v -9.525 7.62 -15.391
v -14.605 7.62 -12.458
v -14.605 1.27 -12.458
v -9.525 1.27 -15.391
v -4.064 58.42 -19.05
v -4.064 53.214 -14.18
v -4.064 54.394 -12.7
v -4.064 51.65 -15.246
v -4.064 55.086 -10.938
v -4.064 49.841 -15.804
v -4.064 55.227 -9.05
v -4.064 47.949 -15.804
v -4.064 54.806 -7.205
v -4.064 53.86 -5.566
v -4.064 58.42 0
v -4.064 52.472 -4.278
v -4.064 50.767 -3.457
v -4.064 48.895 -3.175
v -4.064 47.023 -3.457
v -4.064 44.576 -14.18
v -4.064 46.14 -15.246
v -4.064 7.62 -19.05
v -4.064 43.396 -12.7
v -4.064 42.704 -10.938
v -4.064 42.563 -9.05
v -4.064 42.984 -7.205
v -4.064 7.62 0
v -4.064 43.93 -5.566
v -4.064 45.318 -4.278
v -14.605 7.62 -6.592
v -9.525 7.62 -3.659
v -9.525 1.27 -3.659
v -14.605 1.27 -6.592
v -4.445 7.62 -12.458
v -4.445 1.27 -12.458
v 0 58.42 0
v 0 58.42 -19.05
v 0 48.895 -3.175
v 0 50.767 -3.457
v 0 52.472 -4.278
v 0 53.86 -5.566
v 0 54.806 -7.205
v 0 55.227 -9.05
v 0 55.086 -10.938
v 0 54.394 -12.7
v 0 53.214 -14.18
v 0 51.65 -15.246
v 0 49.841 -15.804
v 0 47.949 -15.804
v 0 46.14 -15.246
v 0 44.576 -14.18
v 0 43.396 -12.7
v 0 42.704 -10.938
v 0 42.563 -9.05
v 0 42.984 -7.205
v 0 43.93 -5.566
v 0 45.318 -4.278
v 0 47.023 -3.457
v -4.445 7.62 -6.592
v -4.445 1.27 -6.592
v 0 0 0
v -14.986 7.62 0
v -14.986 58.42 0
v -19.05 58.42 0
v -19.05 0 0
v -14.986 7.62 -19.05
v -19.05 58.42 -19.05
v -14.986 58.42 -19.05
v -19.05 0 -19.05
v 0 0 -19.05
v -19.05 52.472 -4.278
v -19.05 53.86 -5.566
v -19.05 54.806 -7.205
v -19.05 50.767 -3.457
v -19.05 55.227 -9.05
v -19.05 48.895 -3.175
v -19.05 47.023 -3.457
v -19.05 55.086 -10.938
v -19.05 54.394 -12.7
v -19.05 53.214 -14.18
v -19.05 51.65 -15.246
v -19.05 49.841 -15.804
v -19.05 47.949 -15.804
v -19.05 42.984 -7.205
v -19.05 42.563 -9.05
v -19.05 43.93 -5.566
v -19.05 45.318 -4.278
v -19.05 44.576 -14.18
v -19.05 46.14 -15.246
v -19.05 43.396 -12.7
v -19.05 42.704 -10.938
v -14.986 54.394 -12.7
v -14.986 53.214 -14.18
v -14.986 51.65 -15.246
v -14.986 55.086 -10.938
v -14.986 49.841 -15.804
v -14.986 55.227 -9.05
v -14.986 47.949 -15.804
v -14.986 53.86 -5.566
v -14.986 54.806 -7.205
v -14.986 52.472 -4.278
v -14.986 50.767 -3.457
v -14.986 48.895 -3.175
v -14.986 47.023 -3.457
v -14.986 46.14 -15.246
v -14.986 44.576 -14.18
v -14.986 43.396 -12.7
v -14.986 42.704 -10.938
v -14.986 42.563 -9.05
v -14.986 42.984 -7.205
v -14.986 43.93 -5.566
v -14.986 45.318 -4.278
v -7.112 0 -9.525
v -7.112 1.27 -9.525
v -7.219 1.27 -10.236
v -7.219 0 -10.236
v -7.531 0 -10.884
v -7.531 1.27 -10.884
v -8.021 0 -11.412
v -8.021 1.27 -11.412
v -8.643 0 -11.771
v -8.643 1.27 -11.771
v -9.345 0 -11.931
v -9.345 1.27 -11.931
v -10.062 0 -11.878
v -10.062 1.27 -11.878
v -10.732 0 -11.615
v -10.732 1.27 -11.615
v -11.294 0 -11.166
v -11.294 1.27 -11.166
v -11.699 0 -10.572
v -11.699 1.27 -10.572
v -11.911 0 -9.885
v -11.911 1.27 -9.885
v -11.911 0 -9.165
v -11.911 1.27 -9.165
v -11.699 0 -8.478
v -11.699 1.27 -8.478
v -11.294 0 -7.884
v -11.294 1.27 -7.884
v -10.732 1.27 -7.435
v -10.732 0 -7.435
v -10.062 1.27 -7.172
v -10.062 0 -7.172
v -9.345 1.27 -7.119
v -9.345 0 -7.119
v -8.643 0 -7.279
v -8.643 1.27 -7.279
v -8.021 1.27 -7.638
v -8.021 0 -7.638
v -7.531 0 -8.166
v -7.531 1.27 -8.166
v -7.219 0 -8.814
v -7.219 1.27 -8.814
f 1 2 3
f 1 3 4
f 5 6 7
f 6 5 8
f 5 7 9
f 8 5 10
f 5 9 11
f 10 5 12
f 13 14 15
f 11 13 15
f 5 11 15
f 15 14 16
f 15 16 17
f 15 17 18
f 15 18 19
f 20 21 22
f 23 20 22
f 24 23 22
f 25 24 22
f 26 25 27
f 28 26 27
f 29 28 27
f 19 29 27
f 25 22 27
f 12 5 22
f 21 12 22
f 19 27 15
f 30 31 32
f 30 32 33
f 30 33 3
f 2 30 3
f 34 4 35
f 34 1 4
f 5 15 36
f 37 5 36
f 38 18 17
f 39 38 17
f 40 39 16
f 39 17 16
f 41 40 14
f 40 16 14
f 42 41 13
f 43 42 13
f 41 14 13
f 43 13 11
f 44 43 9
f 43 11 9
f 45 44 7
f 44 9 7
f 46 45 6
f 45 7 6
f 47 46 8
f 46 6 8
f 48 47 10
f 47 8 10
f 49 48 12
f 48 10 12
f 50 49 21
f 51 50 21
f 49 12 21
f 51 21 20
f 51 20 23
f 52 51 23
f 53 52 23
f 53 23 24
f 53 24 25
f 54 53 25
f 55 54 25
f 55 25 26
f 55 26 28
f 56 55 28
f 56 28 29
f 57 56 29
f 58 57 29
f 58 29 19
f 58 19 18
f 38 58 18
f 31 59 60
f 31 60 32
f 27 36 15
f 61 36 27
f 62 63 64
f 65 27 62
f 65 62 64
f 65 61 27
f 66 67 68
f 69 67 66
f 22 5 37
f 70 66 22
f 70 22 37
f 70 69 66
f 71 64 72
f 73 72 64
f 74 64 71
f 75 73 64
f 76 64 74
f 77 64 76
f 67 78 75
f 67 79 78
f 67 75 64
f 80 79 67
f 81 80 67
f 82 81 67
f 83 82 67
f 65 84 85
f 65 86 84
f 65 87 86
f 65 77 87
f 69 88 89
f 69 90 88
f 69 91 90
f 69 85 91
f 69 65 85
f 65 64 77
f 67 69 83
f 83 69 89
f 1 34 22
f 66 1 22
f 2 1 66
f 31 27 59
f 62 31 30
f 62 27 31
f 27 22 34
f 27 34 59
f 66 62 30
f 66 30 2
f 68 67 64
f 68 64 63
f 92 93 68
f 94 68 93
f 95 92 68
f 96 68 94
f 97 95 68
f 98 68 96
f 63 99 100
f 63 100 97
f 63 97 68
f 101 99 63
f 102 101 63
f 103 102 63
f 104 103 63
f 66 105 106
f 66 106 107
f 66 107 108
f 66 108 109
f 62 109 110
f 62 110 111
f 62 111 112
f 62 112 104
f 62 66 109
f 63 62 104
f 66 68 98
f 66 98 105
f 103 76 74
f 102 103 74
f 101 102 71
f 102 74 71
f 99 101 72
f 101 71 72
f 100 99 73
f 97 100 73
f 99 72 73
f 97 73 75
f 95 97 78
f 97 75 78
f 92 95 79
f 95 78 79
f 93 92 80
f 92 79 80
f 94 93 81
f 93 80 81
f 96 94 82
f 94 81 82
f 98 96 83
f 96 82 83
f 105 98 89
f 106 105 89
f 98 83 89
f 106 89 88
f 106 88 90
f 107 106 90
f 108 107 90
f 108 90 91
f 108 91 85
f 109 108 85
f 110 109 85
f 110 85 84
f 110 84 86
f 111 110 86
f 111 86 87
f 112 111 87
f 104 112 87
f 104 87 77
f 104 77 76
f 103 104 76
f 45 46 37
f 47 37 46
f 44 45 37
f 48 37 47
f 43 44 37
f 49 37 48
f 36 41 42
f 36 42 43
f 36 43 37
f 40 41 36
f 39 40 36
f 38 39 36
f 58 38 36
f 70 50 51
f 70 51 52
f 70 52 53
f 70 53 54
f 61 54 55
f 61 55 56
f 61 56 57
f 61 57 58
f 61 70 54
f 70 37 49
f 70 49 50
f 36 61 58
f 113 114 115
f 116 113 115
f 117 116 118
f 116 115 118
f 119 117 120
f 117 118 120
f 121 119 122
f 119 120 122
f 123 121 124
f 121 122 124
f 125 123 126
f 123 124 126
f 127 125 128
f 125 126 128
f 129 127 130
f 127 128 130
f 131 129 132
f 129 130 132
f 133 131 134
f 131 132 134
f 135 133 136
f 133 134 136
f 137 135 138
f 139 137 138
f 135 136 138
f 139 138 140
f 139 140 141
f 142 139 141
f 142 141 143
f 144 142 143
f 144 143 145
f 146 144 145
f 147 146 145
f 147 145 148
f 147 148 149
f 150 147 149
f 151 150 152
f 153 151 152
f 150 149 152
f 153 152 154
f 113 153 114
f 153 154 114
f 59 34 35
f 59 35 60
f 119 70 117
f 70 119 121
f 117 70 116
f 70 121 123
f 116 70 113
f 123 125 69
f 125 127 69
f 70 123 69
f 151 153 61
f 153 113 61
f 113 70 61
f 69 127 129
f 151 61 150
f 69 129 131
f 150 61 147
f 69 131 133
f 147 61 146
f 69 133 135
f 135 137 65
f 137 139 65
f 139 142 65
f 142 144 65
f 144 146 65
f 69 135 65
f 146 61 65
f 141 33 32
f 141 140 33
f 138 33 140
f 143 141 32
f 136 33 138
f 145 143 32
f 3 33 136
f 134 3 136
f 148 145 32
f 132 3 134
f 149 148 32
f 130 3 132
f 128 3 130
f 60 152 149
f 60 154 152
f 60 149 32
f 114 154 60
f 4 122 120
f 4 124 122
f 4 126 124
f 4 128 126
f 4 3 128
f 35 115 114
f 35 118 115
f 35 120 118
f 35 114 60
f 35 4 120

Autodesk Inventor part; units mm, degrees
ref_plane "YZ Plane" through (0, 0, 0) normal (1, 0, 0) x (0, 1, 0)
ref_plane "XZ Plane" through (0, 0, 0) normal (0, 1, 0) x (-1, 0, 0)
ref_plane "XY Plane" through (0, 0, 0) normal (0, 0, 1) x (1, 0, 0)
sketch "Sketch1" plane through (0, 0, 0) normal (0, 1, 0) x (-1, 0, 0)
  line L0 (0, 0) -> (19.05, 0)
  line L1 (19.05, 0) -> (19.05, -19.05)
  line L2 (19.05, -19.05) -> (0, -19.05)
  line L3 (0, -19.05) -> (0, 0)
  dimension "d0" = 19.05
  dimension "d1" = 19.05
extrude "Extrusion1" add sketch "Sketch1" along normal blind 7.62
sketch "Sketch2" plane through (0, 7.62, 0) normal (0, 1, 0) x (1, 0, 0)
  line L0 (-9.525, 3.6591) -> (-14.605, 6.5921)
  line L1 (-14.605, 6.5921) -> (-14.605, 12.4579)
  line L2 (-14.605, 12.4579) -> (-9.525, 15.3909)
  line L3 (-9.525, 15.3909) -> (-4.445, 12.4579)
  line L4 (-4.445, 12.4579) -> (-4.445, 6.5921)
  line L5 (-4.445, 6.5921) -> (-9.525, 3.6591)
  line L6 (0, 19.05) -> (-19.05, 19.05) projected
  line L7 (0, 0) -> (0, 19.05) projected
  point P0 (-9.525, 9.525)
  dimension "d4" = 10.16
  dimension "d5" = 9.525
  dimension "d6" = 9.525
extrude "Extrusion2" cut sketch "Sketch2" against normal blind 6.35
sketch "Sketch3" plane through (0, 1.27, 0) normal (0, 1, 0) x (1, 0, 0)
  circle A0 centre (-9.525, 9.525) radius 2.413
  line L0 (-14.605, 12.4579) -> (-9.525, 15.3909) projected
  line L1 (-9.525, 3.6591) -> (-14.605, 6.5921) projected
  point P0 (0, 0)
  dimension "d9" = 4.826
  dimension "d10" = 5.08
  dimension "d11" = 5.08
extrude "Extrusion3" cut sketch "Sketch3" against normal blind 12.7
sketch "Sketch4" plane through (0, 7.62, 0) normal (0, 1, 0) x (1, 0, 0)
  line L0 (0, 19.05) -> (-19.05, 19.05) projected
  line L1 (-19.05, 19.05) -> (-14.986, 19.05)
  line L2 (-14.986, 19.05) -> (-14.986, 0)
  line L3 (-14.986, 0) -> (-19.05, 0)
  line L4 (-19.05, 0) -> (-19.05, 19.05)
  line L5 (0, 19.05) -> (-4.064, 19.05)
  line L6 (-4.064, 19.05) -> (-4.064, 0)
  line L7 (-4.064, 0) -> (0, 0)
  line L8 (0, 0) -> (0, 19.05)
  line L9 (-19.05, 0) -> (0, 0) projected
  dimension "d14" = 4.064
  dimension "d15" = 4.064
extrude "Extrusion4" add sketch "Sketch4" along normal blind 50.8 contours L8 L7 L6 L0 | L2 L3 L4 L0
sketch "Sketch5" plane through (-19.05, 0, -19.05) normal (-1, 0, 0) x (0, 0, 1)
  circle A0 centre (9.525, 48.895) radius 6.35
  line L0 (19.05, 0) -> (19.05, 58.42) projected
  line L1 (0, 58.42) -> (19.05, 58.42) projected
  dimension "d18" = 12.7
  dimension "d19" = 9.525
  dimension "d20" = 9.525
extrude "Extrusion5" cut sketch "Sketch5" against normal blind 19.05
properties part number "silider shaft" material "ABS Plastic"
